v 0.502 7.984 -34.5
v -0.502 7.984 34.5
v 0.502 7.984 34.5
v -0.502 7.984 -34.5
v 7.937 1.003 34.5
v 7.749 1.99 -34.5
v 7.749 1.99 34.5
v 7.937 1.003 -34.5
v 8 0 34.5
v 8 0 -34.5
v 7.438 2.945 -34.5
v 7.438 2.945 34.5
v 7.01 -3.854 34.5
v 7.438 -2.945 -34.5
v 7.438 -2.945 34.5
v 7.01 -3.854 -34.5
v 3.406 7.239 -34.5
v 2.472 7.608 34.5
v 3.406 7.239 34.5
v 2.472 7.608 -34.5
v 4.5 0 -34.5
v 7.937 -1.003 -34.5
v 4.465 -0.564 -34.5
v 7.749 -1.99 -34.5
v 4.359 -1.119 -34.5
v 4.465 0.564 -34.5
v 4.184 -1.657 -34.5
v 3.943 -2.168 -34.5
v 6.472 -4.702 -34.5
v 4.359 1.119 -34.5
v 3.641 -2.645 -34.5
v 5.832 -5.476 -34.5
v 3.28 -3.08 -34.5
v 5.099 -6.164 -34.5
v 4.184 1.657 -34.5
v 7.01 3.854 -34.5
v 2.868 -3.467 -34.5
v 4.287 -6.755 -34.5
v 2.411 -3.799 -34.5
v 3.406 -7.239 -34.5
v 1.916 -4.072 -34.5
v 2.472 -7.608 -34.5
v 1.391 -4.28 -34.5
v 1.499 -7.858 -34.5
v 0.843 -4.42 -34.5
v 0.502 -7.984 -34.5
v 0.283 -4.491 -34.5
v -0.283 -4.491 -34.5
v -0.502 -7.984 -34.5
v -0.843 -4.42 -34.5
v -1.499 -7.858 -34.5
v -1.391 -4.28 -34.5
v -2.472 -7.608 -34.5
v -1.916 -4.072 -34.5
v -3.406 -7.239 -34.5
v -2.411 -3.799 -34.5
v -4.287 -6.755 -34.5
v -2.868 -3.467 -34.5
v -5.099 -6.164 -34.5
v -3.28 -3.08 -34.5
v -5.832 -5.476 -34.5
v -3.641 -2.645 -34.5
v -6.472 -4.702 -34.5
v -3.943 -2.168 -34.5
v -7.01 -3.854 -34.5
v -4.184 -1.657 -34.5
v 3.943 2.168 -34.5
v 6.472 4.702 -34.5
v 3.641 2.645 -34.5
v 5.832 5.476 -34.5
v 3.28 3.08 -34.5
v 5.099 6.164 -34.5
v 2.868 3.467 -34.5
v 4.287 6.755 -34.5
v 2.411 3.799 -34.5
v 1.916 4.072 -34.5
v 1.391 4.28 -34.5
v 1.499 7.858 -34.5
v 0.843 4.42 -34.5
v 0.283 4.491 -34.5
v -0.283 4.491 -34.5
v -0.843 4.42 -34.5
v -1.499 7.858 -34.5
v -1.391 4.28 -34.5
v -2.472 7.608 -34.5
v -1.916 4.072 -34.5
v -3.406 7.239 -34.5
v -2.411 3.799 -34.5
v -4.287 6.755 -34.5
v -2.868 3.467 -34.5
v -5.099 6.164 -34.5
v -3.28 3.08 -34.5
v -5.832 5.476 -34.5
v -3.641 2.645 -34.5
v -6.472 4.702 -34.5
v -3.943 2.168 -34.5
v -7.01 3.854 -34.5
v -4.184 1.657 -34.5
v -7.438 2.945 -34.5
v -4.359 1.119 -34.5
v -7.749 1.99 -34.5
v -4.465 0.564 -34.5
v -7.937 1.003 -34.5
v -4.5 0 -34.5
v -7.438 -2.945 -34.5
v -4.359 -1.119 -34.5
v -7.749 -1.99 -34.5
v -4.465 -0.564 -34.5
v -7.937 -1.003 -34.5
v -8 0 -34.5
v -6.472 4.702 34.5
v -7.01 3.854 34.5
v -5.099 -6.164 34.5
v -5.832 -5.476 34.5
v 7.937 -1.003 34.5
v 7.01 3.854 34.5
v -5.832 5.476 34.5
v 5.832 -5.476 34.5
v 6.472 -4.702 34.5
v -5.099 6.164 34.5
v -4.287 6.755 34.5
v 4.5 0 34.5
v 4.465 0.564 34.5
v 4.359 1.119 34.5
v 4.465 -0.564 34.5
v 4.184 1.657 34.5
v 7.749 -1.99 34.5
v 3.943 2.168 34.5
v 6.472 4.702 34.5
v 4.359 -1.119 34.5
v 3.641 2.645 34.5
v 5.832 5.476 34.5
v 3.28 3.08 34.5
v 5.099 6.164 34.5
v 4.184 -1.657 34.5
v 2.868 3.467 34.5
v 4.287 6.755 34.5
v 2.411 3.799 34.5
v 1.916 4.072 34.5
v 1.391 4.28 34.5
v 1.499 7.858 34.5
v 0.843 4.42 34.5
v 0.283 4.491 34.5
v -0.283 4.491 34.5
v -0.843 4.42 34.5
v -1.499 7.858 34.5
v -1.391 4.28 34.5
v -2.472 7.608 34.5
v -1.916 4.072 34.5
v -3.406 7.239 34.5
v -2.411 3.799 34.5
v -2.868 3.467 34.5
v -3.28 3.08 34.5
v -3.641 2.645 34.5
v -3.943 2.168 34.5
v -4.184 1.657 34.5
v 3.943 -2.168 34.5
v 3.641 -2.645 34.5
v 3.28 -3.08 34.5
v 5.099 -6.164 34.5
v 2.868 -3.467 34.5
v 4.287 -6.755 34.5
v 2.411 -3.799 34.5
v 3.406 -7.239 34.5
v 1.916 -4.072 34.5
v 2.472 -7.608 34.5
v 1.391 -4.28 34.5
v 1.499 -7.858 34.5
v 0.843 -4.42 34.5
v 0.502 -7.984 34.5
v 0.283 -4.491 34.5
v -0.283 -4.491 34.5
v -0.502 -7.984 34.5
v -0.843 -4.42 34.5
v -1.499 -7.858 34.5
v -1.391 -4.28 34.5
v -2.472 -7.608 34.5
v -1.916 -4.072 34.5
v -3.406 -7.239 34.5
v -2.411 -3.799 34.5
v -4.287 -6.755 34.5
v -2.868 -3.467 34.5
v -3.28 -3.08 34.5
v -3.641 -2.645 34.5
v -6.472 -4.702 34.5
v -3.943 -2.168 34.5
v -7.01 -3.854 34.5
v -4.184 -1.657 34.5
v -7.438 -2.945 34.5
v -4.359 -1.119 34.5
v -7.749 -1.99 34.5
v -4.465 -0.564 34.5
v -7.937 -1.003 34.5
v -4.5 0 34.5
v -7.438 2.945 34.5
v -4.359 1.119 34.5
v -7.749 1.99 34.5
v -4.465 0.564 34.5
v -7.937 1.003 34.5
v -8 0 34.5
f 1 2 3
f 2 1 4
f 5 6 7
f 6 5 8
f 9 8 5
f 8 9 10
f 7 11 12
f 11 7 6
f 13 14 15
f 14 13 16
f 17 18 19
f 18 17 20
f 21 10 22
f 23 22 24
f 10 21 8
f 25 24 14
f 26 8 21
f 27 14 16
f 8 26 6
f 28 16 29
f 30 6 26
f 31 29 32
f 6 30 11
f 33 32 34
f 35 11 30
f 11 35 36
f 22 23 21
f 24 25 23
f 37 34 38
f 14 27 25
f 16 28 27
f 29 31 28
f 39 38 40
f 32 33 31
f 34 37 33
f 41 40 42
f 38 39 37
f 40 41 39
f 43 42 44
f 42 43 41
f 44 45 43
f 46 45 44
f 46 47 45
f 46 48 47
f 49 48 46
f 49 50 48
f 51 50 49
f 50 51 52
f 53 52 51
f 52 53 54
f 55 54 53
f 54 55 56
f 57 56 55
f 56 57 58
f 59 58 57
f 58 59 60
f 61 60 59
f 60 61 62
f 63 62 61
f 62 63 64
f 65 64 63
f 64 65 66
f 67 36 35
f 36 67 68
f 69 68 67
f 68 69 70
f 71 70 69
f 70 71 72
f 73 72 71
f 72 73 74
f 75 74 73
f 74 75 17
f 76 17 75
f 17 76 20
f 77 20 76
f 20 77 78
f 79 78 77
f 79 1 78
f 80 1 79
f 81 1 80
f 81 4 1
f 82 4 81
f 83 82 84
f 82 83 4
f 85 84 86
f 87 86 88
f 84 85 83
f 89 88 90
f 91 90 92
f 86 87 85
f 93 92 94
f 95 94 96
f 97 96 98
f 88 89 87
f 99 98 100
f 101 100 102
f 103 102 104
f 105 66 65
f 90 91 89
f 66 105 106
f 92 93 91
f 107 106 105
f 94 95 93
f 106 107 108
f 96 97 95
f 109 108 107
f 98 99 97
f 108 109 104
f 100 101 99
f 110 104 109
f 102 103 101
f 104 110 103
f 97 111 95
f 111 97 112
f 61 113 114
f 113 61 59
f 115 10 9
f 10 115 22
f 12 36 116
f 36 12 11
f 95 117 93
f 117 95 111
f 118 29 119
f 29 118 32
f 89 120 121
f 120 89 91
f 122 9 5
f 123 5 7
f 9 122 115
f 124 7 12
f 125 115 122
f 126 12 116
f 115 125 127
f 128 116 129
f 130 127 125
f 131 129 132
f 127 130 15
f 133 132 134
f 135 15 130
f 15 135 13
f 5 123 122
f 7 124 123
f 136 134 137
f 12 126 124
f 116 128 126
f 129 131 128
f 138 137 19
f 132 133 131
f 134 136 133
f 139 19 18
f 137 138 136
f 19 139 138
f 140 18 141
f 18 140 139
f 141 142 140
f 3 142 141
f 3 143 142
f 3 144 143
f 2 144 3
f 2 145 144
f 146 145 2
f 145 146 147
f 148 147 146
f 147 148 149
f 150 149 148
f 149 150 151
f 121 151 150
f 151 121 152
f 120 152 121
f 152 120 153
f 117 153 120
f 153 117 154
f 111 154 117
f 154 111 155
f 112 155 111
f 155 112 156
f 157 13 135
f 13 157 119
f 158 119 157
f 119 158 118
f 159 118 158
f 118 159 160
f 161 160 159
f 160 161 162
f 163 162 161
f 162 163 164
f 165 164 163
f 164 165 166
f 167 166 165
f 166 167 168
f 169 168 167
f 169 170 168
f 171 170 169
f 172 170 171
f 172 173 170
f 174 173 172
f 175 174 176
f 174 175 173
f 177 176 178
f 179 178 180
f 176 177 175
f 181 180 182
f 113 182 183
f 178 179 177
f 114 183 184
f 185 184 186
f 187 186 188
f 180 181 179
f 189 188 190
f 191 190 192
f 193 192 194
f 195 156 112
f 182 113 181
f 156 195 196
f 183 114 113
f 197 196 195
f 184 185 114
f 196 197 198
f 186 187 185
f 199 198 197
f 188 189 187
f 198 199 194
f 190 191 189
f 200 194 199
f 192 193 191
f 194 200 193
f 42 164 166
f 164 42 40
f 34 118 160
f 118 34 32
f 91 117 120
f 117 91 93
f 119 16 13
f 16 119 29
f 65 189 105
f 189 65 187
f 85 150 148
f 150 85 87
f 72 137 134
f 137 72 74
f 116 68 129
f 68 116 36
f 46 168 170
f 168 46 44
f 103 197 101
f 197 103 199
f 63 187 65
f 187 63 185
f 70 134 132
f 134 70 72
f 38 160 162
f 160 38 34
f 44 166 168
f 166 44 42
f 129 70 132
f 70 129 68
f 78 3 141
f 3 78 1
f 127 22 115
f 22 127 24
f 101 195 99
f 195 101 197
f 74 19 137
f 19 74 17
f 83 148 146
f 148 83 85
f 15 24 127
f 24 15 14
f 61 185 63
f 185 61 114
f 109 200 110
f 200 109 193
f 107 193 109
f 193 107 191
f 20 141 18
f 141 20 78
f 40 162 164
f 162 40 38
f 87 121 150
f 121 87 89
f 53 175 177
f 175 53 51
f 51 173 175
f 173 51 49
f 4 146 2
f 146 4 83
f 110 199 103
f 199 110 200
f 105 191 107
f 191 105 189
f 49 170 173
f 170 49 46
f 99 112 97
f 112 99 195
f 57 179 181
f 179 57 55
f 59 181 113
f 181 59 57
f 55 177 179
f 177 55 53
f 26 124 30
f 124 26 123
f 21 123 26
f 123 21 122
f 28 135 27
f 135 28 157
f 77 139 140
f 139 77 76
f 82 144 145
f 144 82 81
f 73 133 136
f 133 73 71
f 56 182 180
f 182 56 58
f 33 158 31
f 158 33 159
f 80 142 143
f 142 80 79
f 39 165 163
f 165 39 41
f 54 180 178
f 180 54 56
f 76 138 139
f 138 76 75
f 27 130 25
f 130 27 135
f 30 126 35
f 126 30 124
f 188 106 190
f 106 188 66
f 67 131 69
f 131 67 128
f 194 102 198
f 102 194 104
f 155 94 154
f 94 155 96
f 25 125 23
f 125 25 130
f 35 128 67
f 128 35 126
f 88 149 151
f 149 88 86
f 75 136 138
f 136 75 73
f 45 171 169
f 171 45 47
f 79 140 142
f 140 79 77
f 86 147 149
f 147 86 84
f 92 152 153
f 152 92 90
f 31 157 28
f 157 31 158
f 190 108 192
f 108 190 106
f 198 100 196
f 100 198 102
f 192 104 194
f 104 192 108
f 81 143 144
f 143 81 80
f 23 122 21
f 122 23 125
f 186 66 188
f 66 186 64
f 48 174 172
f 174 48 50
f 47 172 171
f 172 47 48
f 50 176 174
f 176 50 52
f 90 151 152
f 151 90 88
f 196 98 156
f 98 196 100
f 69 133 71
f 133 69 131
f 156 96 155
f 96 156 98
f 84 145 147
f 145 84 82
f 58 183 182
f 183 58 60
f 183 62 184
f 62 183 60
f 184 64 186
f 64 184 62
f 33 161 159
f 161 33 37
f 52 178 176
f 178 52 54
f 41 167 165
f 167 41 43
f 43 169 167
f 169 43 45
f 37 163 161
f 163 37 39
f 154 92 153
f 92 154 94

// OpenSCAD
$fn = 50;


difference() {
	union() {
		translate(v = [0, 0, -34.5000000000]) {
			cylinder(h = 69, r = 8.0000000000);
		}
	}
	union() {
		translate(v = [0, 0, -100.0000000000]) {
			cylinder(h = 200, r = 4.5000000000);
		}
	}
}
